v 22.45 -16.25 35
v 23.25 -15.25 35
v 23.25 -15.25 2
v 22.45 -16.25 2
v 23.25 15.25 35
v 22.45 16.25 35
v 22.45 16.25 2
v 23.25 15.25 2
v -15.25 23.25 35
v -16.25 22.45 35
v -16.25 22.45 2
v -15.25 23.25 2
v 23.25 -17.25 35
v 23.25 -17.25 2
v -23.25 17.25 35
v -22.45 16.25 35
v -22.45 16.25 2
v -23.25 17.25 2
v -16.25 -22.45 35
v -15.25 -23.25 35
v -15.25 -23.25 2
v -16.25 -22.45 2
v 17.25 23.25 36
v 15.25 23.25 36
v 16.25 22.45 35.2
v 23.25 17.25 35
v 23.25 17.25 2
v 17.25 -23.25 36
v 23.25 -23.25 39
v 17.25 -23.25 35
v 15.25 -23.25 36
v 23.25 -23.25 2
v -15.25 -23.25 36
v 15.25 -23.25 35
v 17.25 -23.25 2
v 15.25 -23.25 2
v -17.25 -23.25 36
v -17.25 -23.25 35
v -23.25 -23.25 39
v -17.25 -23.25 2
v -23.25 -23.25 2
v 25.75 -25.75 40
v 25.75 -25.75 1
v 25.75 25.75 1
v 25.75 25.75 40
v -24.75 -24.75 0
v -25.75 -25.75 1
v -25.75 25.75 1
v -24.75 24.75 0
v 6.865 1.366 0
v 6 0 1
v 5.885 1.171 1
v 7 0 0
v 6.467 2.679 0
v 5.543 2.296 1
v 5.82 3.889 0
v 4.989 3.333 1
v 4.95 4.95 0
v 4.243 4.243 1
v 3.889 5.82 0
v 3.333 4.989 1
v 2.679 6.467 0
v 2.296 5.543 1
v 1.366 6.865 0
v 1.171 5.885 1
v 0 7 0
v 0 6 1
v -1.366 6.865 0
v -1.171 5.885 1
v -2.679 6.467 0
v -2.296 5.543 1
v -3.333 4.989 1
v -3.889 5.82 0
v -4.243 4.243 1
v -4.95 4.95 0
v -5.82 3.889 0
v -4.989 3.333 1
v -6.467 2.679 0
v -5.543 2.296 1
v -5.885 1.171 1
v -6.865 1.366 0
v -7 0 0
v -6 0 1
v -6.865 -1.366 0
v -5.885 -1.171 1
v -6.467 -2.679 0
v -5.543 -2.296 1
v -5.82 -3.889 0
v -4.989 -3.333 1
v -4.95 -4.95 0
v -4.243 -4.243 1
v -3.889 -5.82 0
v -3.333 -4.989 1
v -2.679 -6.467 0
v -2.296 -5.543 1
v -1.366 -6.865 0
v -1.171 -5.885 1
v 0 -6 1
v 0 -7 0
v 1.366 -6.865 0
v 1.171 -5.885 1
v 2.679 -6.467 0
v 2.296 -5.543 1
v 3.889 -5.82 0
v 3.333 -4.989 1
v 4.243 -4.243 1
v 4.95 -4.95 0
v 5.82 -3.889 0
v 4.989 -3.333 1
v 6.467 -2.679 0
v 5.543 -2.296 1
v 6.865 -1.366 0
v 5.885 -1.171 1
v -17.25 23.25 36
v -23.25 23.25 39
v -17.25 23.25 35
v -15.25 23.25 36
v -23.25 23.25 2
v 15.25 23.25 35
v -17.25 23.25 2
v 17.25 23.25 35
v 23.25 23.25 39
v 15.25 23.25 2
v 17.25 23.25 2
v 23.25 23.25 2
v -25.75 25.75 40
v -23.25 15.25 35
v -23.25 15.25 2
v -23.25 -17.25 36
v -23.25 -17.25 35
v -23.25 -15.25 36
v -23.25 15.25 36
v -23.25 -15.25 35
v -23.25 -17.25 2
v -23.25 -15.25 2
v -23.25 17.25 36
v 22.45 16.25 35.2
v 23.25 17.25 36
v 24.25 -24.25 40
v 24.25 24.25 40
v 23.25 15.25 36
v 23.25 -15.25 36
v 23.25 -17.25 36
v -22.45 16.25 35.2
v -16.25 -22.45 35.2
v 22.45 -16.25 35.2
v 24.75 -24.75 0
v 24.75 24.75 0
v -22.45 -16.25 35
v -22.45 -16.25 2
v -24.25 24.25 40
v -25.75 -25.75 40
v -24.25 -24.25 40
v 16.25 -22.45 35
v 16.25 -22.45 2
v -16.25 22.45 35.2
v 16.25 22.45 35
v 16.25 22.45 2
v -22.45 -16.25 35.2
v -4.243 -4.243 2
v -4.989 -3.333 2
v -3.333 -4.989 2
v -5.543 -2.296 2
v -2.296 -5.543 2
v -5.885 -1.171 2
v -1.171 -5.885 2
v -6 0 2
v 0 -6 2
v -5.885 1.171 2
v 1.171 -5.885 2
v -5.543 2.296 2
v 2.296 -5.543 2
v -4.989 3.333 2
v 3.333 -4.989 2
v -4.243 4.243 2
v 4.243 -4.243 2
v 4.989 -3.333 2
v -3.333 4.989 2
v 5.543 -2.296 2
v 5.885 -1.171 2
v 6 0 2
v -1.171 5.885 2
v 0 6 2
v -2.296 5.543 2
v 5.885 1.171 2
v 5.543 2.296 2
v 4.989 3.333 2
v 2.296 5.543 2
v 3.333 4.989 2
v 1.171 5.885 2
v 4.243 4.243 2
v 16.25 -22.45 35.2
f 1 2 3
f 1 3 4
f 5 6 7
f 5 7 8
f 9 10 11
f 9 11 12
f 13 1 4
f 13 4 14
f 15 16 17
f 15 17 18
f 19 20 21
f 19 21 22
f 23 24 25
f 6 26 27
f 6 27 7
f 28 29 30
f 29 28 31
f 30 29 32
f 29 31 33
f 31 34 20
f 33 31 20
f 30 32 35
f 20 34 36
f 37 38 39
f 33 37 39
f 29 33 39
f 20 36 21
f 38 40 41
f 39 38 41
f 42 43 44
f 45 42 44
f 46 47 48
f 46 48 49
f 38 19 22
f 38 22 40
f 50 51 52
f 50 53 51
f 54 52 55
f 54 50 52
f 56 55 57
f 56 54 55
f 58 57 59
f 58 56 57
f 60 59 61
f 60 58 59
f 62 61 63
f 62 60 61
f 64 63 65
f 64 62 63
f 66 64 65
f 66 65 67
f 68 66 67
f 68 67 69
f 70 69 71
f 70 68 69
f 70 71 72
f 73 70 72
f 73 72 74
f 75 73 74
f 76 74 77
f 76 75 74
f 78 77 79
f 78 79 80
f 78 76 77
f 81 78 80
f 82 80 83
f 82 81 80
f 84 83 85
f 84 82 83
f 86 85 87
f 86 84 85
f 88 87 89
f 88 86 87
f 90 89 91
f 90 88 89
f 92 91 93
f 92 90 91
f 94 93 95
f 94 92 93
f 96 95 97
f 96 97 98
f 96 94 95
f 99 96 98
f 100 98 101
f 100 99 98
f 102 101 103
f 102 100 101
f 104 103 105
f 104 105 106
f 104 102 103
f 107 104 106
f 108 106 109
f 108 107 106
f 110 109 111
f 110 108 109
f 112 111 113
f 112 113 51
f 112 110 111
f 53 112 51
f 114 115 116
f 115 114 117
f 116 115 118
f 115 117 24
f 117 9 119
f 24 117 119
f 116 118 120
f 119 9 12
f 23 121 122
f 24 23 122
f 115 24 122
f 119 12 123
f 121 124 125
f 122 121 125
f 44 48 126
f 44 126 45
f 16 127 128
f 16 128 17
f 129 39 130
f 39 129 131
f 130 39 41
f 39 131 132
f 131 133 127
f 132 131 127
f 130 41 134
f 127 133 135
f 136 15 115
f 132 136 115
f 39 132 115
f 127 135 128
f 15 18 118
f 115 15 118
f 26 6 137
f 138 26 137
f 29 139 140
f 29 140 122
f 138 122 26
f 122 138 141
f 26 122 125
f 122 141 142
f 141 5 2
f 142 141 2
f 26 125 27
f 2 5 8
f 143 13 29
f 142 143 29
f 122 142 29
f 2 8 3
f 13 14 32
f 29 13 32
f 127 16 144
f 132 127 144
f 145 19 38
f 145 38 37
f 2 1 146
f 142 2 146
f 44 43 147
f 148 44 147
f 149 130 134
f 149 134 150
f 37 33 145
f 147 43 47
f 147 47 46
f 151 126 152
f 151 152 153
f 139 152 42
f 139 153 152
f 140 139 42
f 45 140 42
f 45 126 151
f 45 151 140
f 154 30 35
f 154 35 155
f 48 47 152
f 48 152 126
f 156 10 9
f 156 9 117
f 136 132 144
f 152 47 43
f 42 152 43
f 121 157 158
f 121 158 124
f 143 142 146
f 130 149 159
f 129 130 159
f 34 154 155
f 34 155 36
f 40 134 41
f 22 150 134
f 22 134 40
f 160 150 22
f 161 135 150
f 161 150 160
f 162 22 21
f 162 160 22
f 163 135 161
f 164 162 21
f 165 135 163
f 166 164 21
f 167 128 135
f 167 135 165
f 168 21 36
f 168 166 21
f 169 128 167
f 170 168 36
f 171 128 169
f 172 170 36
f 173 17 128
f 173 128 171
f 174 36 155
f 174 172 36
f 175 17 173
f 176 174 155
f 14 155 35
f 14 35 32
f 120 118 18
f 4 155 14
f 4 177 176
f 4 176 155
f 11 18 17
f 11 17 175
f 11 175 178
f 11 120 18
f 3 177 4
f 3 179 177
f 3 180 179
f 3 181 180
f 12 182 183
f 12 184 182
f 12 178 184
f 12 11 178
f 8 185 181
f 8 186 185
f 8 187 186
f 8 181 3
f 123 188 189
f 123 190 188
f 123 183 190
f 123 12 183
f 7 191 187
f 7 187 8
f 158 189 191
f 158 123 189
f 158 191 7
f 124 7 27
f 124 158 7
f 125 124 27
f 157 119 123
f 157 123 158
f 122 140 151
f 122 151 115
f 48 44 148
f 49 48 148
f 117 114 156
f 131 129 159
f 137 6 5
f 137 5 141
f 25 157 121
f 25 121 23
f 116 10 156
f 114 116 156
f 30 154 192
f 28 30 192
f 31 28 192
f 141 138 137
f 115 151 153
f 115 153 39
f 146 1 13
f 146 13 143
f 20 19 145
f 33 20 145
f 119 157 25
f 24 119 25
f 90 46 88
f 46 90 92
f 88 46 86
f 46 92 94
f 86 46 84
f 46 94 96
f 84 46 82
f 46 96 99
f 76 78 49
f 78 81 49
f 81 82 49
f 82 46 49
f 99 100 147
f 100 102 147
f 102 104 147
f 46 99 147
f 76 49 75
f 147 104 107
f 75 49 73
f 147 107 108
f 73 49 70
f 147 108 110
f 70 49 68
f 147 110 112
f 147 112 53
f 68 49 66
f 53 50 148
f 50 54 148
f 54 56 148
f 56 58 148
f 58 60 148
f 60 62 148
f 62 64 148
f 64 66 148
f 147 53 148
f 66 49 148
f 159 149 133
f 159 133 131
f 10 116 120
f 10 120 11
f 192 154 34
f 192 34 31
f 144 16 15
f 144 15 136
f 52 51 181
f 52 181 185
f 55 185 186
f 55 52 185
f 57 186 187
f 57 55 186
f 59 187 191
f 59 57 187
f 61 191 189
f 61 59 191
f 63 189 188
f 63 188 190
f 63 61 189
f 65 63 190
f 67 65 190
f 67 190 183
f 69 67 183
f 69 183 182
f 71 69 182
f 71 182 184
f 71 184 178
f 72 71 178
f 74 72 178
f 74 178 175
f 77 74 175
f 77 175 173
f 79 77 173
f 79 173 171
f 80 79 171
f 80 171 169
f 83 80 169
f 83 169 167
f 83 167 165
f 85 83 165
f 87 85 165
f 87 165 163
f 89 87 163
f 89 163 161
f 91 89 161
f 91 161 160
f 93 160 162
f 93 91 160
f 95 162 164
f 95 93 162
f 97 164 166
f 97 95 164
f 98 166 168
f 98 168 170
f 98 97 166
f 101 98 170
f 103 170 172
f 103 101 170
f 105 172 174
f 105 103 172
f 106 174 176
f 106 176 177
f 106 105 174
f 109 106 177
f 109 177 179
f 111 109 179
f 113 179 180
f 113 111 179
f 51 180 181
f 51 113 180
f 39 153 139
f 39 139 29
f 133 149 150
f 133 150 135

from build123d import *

# Parameters (mm, degrees)
F0_W          = 51.5
F0_H          = 51.5
F1_DEPTH      = 40
F2_DEPTH      = 35
F0_R          = 6
F3_DEPTH      = 2
F4_T4_DEPTH   = 7.1433659759
F4_T10_DEPTH  = 7.1433659759
F4_T16_DEPTH  = 7.1433659759
F4_T22_DEPTH  = 7.1433659759
F4_T28_DEPTH  = 7.1433659759
F4_T34_DEPTH  = 7.1433659759
F4_T40_DEPTH  = 7.1433659759
F4_T46_DEPTH  = 7.1433659759
F4_T49_DEPTH  = 46.5
F4_T51_DEPTH  = 46.5
F4_T53_DEPTH  = 56.6433659759
F4_T55_DEPTH  = 56.6433659759
F4_T63_DEPTH  = 49.071682988
F4_T67_DEPTH  = 49.071682988
F4_T74_DEPTH  = 49.071682988
F4_T78_DEPTH  = 49.071682988
F4_T85_DEPTH  = 49.071682988
F4_T89_DEPTH  = 49.071682988
F4_T96_DEPTH  = 49.071682988
F4_T100_DEPTH = 49.071682988


# Not quite as in the source:
# - a fillet or chamfer that OpenCascade refuses, or shapes differently, is made with other operations: its cross-section is extruded or revolved along the edge and cut away or added


with BuildPart() as f1:
    # F0 (on Top) → F1 (new body)
    with BuildSketch(Plane.XY):
        Rectangle(F0_W, F0_H)
        Polygon((-23.25, 17.25), (-23.25, 23.25), (-17.25, 23.25), (-15.25, 23.25), (15.25, 23.25), (17.25, 23.25), (23.25, 23.25), (23.25, 17.25), (23.25, 15.25), (23.25, -15.25), (23.25, -17.25), (23.25, -23.25), (17.25, -23.25), (15.25, -23.25), (-15.25, -23.25), (-17.25, -23.25), (-23.25, -23.25), (-23.25, -17.25), (-23.25, -15.25), (-23.25, 15.25), align=None, mode=Mode.SUBTRACT)
    extrude(amount=F1_DEPTH)

    # F0 (on Top) → F2 (join)
    with BuildSketch(Plane.XY):
        Rectangle(F0_W, F0_H)
        Polygon((-23.25, 17.25), (-23.25, 23.25), (-17.25, 23.25), (-15.25, 23.25), (15.25, 23.25), (17.25, 23.25), (23.25, 23.25), (23.25, 17.25), (23.25, 15.25), (23.25, -15.25), (23.25, -17.25), (23.25, -23.25), (17.25, -23.25), (15.25, -23.25), (-15.25, -23.25), (-17.25, -23.25), (-23.25, -23.25), (-23.25, -17.25), (-23.25, -15.25), (-23.25, 15.25), align=None, mode=Mode.SUBTRACT)
        Polygon((-22.45, 16.25), (-23.25, 17.25), (-23.25, 15.25), align=None)
        Polygon((-15.25, 23.25), (-17.25, 23.25), (-16.25, 22.45), align=None)
        Polygon((17.25, 23.25), (15.25, 23.25), (16.25, 22.45), align=None)
        Polygon((23.25, 15.25), (23.25, 17.25), (22.45, 16.25), align=None)
        Polygon((23.25, -17.25), (23.25, -15.25), (22.45, -16.25), align=None)
        Polygon((16.25, -22.45), (15.25, -23.25), (17.25, -23.25), align=None)
        Polygon((-16.25, -22.45), (-17.25, -23.25), (-15.25, -23.25), align=None)
        Polygon((-22.45, -16.25), (-23.25, -15.25), (-23.25, -17.25), align=None)
    extrude(amount=F2_DEPTH)

    # F0 (on Top) → F3 (join)
    with BuildSketch(Plane.XY):
        Polygon((-17.25, 23.25), (-23.25, 23.25), (-23.25, 17.25), (-22.45, 16.25), (-23.25, 15.25), (-23.25, -15.25), (-22.45, -16.25), (-23.25, -17.25), (-23.25, -23.25), (-17.25, -23.25), (-16.25, -22.45), (-15.25, -23.25), (15.25, -23.25), (16.25, -22.45), (17.25, -23.25), (23.25, -23.25), (23.25, -17.25), (22.45, -16.25), (23.25, -15.25), (23.25, 15.25), (22.45, 16.25), (23.25, 17.25), (23.25, 23.25), (17.25, 23.25), (16.25, 22.45), (15.25, 23.25), (-15.25, 23.25), (-16.25, 22.45), align=None)
        Circle(F0_R, mode=Mode.SUBTRACT)
    extrude(amount=F3_DEPTH)

    # F4: chamfer of 1 on 17 edges, made by hand


with BuildPart() as f4_tool2:
    # F4_s3 → F4_t4 (new body)
    with BuildSketch(Plane.YZ.offset(12.678317012)):
        Polygon((23.25, 36), (22.25, 35), (23.25, 35), align=None)
    extrude(amount=F4_T4_DEPTH)

    split(bisect_by=Plane(origin=(17.2926829268, 21.6158536585, 0), x_dir=(0, 0, 1), z_dir=(0.6246950476, 0.7808688094, 0)), keep=Keep.TOP)

    split(bisect_by=Plane(origin=(-4.6097560976, 5.762195122, 0), x_dir=(0, 0, 1), z_dir=(-0.6246950476, 0.7808688094, 0)), keep=Keep.TOP)


with BuildPart() as f1_1:
    add(f1.part)

    # F4_t1: union F4_tool2
    add(f4_tool2.part)


with BuildPart() as f4_tool8:
    # F4_s9 → F4_t10 (new body)
    with BuildSketch(Plane.YZ.offset(-19.821682988)):
        Polygon((23.25, 36), (22.25, 35), (23.25, 35), align=None)
    extrude(amount=F4_T10_DEPTH)

    split(bisect_by=Plane(origin=(4.6097560976, 5.762195122, 0), x_dir=(0, 0, 1), z_dir=(0.6246950476, 0.7808688094, 0)), keep=Keep.TOP)

    split(bisect_by=Plane(origin=(-17.2926829268, 21.6158536585, 0), x_dir=(0, 0, 1), z_dir=(-0.6246950476, 0.7808688094, 0)), keep=Keep.TOP)


with BuildPart() as f1_2:
    add(f1_1.part)

    # F4_t7: union F4_tool8
    add(f4_tool8.part)


with BuildPart() as f4_tool14:
    # F4_s15 → F4_t16 (new body)
    with BuildSketch(Plane.XZ.offset(12.678317012)):
        Polygon((23.25, 36), (22.25, 35), (23.25, 35), align=None)
    extrude(amount=F4_T16_DEPTH)

    split(bisect_by=Plane(origin=(21.6158536585, -17.2926829268, 0), x_dir=(0, 0, 1), z_dir=(0.7808688094, -0.6246950476, 0)), keep=Keep.TOP)

    split(bisect_by=Plane(origin=(5.762195122, 4.6097560976, 0), x_dir=(0, 0, 1), z_dir=(0.7808688094, 0.6246950476, 0)), keep=Keep.TOP)


with BuildPart() as f1_3:
    add(f1_2.part)

    # F4_t13: union F4_tool14
    add(f4_tool14.part)


with BuildPart() as f4_tool20:
    # F4_s21 → F4_t22 (new body)
    with BuildSketch(Plane.XZ.offset(-19.821682988)):
        Polygon((23.25, 36), (22.25, 35), (23.25, 35), align=None)
    extrude(amount=F4_T22_DEPTH)

    split(bisect_by=Plane(origin=(5.762195122, -4.6097560976, 0), x_dir=(0, 0, 1), z_dir=(0.7808688094, -0.6246950476, 0)), keep=Keep.TOP)

    split(bisect_by=Plane(origin=(21.6158536585, 17.2926829268, 0), x_dir=(0, 0, 1), z_dir=(0.7808688094, 0.6246950476, 0)), keep=Keep.TOP)


with BuildPart() as f1_4:
    add(f1_3.part)

    # F4_t19: union F4_tool20
    add(f4_tool20.part)


with BuildPart() as f4_tool26:
    # F4_s27 → F4_t28 (new body)
    with BuildSketch(Plane.XZ.offset(-12.678317012)):
        Polygon((-23.25, 36), (-22.25, 35), (-23.25, 35), align=None)
    extrude(amount=-F4_T28_DEPTH)

    split(bisect_by=Plane(origin=(-21.6158536585, 17.2926829268, 0), x_dir=(0, 0, 1), z_dir=(-0.7808688094, 0.6246950476, 0)), keep=Keep.TOP)

    split(bisect_by=Plane(origin=(-5.762195122, -4.6097560976, 0), x_dir=(0, 0, 1), z_dir=(-0.7808688094, -0.6246950476, 0)), keep=Keep.TOP)


with BuildPart() as f1_5:
    add(f1_4.part)

    # F4_t25: union F4_tool26
    add(f4_tool26.part)


with BuildPart() as f4_tool32:
    # F4_s33 → F4_t34 (new body)
    with BuildSketch(Plane.XZ.offset(19.821682988)):
        Polygon((-23.25, 36), (-22.25, 35), (-23.25, 35), align=None)
    extrude(amount=-F4_T34_DEPTH)

    split(bisect_by=Plane(origin=(-5.762195122, 4.6097560976, 0), x_dir=(0, 0, 1), z_dir=(-0.7808688094, 0.6246950476, 0)), keep=Keep.TOP)

    split(bisect_by=Plane(origin=(-21.6158536585, -17.2926829268, 0), x_dir=(0, 0, 1), z_dir=(-0.7808688094, -0.6246950476, 0)), keep=Keep.TOP)


with BuildPart() as f1_6:
    add(f1_5.part)

    # F4_t31: union F4_tool32
    add(f4_tool32.part)


with BuildPart() as f4_tool38:
    # F4_s39 → F4_t40 (new body)
    with BuildSketch(Plane.YZ.offset(-12.678317012)):
        Polygon((-23.25, 36), (-22.25, 35), (-23.25, 35), align=None)
    extrude(amount=-F4_T40_DEPTH)

    split(bisect_by=Plane(origin=(-17.2926829268, -21.6158536585, 0), x_dir=(0, 0, 1), z_dir=(-0.6246950476, -0.7808688094, 0)), keep=Keep.TOP)

    split(bisect_by=Plane(origin=(4.6097560976, -5.762195122, 0), x_dir=(0, 0, 1), z_dir=(0.6246950476, -0.7808688094, 0)), keep=Keep.TOP)


with BuildPart() as f1_7:
    add(f1_6.part)

    # F4_t37: union F4_tool38
    add(f4_tool38.part)


with BuildPart() as f4_tool44:
    # F4_s45 → F4_t46 (new body)
    with BuildSketch(Plane.YZ.offset(19.821682988)):
        Polygon((-23.25, 36), (-22.25, 35), (-23.25, 35), align=None)
    extrude(amount=-F4_T46_DEPTH)

    split(bisect_by=Plane(origin=(-4.6097560976, -5.762195122, 0), x_dir=(0, 0, 1), z_dir=(-0.6246950476, -0.7808688094, 0)), keep=Keep.TOP)

    split(bisect_by=Plane(origin=(17.2926829268, -21.6158536585, 0), x_dir=(0, 0, 1), z_dir=(0.6246950476, -0.7808688094, 0)), keep=Keep.TOP)


with BuildPart() as f1_8:
    add(f1_7.part)

    # F4_t43: union F4_tool44
    add(f4_tool44.part)

    # F4_s50 → F4_t49 (cut)
    with BuildSketch(Plane.YZ.offset(-23.25)):
        Polygon((24.25, 40), (23.25, 39), (23.25, 40), align=None)
        Polygon((-24.25, 40), (-23.25, 39), (-23.25, 40), align=None)
    extrude(amount=F4_T49_DEPTH, mode=Mode.SUBTRACT)

    # F4_s52 → F4_t51 (cut)
    with BuildSketch(Plane.XZ.offset(-23.25)):
        Polygon((-24.25, 40), (-23.25, 39), (-23.25, 40), align=None)
        Polygon((24.25, 40), (23.25, 39), (23.25, 40), align=None)
    extrude(amount=F4_T51_DEPTH, mode=Mode.SUBTRACT)

    # F4_s54 → F4_t53 (cut)
    with BuildSketch(Plane.YZ.offset(-28.321682988)):
        Polygon((25.75, 1), (24.75, 0), (25.75, 0), align=None)
        Polygon((-25.75, 1), (-24.75, 0), (-25.75, 0), align=None)
    extrude(amount=F4_T53_DEPTH, mode=Mode.SUBTRACT)

    # F4_s56 → F4_t55 (cut)
    with BuildSketch(Plane.XZ.offset(-28.321682988)):
        Polygon((-25.75, 1), (-24.75, 0), (-25.75, 0), align=None)
        Polygon((25.75, 1), (24.75, 0), (25.75, 0), align=None)
    extrude(amount=F4_T55_DEPTH, mode=Mode.SUBTRACT)

    # F4_s57 → F4_t58 (revolve, cut)
    with BuildSketch(Plane.XZ):
        Polygon((6, 1), (7, 0), (6, 0), align=None)
    revolve(axis=Axis((0, 0, 0), (0, 0, 1)), mode=Mode.SUBTRACT)


with BuildPart() as f4_tool61:
    # F4_s62 → F4_t63 (new body)
    with BuildSketch(Plane.YZ.offset(25.821682988)):
        Polygon((24.25, 40), (23.25, 39), (23.25, 40), align=None)
    extrude(amount=-F4_T63_DEPTH)

    split(bisect_by=Plane.YZ.offset(23.25), keep=Keep.TOP)


with BuildPart() as f4_tool65:
    # F4_s66 → F4_t67 (new body)
    with BuildSketch(Plane.XZ.offset(23.25)):
        Polygon((24.25, 40), (23.25, 39), (23.25, 40), align=None)
    extrude(amount=-F4_T67_DEPTH)

    split(bisect_by=Plane.XZ.offset(-23.25), keep=Keep.BOTTOM)


with BuildPart() as f4_tool61_1:
    add(f4_tool61.part)

    # F4_t69: intersect F4_tool65
    add(f4_tool65.part, mode=Mode.INTERSECT)


with BuildPart() as f1_9:
    add(f1_8.part)

    # F4_t59: cut F4_tool61
    add(f4_tool61_1.part, mode=Mode.SUBTRACT)


with BuildPart() as f4_tool72:
    # F4_s73 → F4_t74 (new body)
    with BuildSketch(Plane.XZ.offset(-25.821682988)):
        Polygon((-24.25, 40), (-23.25, 39), (-23.25, 40), align=None)
    extrude(amount=F4_T74_DEPTH)

    split(bisect_by=Plane.XZ.offset(-23.25), keep=Keep.BOTTOM)


with BuildPart() as f4_tool76:
    # F4_s77 → F4_t78 (new body)
    with BuildSketch(Plane.YZ.offset(23.25)):
        Polygon((24.25, 40), (23.25, 39), (23.25, 40), align=None)
    extrude(amount=-F4_T78_DEPTH)

    split(bisect_by=Plane.YZ.offset(-23.25), keep=Keep.BOTTOM)


with BuildPart() as f4_tool72_1:
    add(f4_tool72.part)

    # F4_t80: intersect F4_tool76
    add(f4_tool76.part, mode=Mode.INTERSECT)


with BuildPart() as f1_10:
    add(f1_9.part)

    # F4_t70: cut F4_tool72
    add(f4_tool72_1.part, mode=Mode.SUBTRACT)


with BuildPart() as f4_tool83:
    # F4_s84 → F4_t85 (new body)
    with BuildSketch(Plane.XZ.offset(-23.25)):
        Polygon((-24.25, 40), (-23.25, 39), (-23.25, 40), align=None)
    extrude(amount=F4_T85_DEPTH)

    split(bisect_by=Plane.XZ.offset(23.25), keep=Keep.TOP)


with BuildPart() as f4_tool87:
    # F4_s88 → F4_t89 (new body)
    with BuildSketch(Plane.YZ.offset(-25.821682988)):
        Polygon((-24.25, 40), (-23.25, 39), (-23.25, 40), align=None)
    extrude(amount=F4_T89_DEPTH)

    split(bisect_by=Plane.YZ.offset(-23.25), keep=Keep.BOTTOM)


with BuildPart() as f4_tool83_1:
    add(f4_tool83.part)

    # F4_t91: intersect F4_tool87
    add(f4_tool87.part, mode=Mode.INTERSECT)


with BuildPart() as f1_11:
    add(f1_10.part)

    # F4_t81: cut F4_tool83
    add(f4_tool83_1.part, mode=Mode.SUBTRACT)


with BuildPart() as f4_tool94:
    # F4_s95 → F4_t96 (new body)
    with BuildSketch(Plane.XZ.offset(25.821682988)):
        Polygon((24.25, 40), (23.25, 39), (23.25, 40), align=None)
    extrude(amount=-F4_T96_DEPTH)

    split(bisect_by=Plane.XZ.offset(23.25), keep=Keep.TOP)


with BuildPart() as f4_tool98:
    # F4_s99 → F4_t100 (new body)
    with BuildSketch(Plane.YZ.offset(-23.25)):
        Polygon((-24.25, 40), (-23.25, 39), (-23.25, 40), align=None)
    extrude(amount=F4_T100_DEPTH)

    split(bisect_by=Plane.YZ.offset(23.25), keep=Keep.TOP)


with BuildPart() as f4_tool94_1:
    add(f4_tool94.part)

    # F4_t102: intersect F4_tool98
    add(f4_tool98.part, mode=Mode.INTERSECT)


with BuildPart() as f1_12:
    add(f1_11.part)

    # F4_t92: cut F4_tool94
    add(f4_tool94_1.part, mode=Mode.SUBTRACT)


solid = f1_12.part
